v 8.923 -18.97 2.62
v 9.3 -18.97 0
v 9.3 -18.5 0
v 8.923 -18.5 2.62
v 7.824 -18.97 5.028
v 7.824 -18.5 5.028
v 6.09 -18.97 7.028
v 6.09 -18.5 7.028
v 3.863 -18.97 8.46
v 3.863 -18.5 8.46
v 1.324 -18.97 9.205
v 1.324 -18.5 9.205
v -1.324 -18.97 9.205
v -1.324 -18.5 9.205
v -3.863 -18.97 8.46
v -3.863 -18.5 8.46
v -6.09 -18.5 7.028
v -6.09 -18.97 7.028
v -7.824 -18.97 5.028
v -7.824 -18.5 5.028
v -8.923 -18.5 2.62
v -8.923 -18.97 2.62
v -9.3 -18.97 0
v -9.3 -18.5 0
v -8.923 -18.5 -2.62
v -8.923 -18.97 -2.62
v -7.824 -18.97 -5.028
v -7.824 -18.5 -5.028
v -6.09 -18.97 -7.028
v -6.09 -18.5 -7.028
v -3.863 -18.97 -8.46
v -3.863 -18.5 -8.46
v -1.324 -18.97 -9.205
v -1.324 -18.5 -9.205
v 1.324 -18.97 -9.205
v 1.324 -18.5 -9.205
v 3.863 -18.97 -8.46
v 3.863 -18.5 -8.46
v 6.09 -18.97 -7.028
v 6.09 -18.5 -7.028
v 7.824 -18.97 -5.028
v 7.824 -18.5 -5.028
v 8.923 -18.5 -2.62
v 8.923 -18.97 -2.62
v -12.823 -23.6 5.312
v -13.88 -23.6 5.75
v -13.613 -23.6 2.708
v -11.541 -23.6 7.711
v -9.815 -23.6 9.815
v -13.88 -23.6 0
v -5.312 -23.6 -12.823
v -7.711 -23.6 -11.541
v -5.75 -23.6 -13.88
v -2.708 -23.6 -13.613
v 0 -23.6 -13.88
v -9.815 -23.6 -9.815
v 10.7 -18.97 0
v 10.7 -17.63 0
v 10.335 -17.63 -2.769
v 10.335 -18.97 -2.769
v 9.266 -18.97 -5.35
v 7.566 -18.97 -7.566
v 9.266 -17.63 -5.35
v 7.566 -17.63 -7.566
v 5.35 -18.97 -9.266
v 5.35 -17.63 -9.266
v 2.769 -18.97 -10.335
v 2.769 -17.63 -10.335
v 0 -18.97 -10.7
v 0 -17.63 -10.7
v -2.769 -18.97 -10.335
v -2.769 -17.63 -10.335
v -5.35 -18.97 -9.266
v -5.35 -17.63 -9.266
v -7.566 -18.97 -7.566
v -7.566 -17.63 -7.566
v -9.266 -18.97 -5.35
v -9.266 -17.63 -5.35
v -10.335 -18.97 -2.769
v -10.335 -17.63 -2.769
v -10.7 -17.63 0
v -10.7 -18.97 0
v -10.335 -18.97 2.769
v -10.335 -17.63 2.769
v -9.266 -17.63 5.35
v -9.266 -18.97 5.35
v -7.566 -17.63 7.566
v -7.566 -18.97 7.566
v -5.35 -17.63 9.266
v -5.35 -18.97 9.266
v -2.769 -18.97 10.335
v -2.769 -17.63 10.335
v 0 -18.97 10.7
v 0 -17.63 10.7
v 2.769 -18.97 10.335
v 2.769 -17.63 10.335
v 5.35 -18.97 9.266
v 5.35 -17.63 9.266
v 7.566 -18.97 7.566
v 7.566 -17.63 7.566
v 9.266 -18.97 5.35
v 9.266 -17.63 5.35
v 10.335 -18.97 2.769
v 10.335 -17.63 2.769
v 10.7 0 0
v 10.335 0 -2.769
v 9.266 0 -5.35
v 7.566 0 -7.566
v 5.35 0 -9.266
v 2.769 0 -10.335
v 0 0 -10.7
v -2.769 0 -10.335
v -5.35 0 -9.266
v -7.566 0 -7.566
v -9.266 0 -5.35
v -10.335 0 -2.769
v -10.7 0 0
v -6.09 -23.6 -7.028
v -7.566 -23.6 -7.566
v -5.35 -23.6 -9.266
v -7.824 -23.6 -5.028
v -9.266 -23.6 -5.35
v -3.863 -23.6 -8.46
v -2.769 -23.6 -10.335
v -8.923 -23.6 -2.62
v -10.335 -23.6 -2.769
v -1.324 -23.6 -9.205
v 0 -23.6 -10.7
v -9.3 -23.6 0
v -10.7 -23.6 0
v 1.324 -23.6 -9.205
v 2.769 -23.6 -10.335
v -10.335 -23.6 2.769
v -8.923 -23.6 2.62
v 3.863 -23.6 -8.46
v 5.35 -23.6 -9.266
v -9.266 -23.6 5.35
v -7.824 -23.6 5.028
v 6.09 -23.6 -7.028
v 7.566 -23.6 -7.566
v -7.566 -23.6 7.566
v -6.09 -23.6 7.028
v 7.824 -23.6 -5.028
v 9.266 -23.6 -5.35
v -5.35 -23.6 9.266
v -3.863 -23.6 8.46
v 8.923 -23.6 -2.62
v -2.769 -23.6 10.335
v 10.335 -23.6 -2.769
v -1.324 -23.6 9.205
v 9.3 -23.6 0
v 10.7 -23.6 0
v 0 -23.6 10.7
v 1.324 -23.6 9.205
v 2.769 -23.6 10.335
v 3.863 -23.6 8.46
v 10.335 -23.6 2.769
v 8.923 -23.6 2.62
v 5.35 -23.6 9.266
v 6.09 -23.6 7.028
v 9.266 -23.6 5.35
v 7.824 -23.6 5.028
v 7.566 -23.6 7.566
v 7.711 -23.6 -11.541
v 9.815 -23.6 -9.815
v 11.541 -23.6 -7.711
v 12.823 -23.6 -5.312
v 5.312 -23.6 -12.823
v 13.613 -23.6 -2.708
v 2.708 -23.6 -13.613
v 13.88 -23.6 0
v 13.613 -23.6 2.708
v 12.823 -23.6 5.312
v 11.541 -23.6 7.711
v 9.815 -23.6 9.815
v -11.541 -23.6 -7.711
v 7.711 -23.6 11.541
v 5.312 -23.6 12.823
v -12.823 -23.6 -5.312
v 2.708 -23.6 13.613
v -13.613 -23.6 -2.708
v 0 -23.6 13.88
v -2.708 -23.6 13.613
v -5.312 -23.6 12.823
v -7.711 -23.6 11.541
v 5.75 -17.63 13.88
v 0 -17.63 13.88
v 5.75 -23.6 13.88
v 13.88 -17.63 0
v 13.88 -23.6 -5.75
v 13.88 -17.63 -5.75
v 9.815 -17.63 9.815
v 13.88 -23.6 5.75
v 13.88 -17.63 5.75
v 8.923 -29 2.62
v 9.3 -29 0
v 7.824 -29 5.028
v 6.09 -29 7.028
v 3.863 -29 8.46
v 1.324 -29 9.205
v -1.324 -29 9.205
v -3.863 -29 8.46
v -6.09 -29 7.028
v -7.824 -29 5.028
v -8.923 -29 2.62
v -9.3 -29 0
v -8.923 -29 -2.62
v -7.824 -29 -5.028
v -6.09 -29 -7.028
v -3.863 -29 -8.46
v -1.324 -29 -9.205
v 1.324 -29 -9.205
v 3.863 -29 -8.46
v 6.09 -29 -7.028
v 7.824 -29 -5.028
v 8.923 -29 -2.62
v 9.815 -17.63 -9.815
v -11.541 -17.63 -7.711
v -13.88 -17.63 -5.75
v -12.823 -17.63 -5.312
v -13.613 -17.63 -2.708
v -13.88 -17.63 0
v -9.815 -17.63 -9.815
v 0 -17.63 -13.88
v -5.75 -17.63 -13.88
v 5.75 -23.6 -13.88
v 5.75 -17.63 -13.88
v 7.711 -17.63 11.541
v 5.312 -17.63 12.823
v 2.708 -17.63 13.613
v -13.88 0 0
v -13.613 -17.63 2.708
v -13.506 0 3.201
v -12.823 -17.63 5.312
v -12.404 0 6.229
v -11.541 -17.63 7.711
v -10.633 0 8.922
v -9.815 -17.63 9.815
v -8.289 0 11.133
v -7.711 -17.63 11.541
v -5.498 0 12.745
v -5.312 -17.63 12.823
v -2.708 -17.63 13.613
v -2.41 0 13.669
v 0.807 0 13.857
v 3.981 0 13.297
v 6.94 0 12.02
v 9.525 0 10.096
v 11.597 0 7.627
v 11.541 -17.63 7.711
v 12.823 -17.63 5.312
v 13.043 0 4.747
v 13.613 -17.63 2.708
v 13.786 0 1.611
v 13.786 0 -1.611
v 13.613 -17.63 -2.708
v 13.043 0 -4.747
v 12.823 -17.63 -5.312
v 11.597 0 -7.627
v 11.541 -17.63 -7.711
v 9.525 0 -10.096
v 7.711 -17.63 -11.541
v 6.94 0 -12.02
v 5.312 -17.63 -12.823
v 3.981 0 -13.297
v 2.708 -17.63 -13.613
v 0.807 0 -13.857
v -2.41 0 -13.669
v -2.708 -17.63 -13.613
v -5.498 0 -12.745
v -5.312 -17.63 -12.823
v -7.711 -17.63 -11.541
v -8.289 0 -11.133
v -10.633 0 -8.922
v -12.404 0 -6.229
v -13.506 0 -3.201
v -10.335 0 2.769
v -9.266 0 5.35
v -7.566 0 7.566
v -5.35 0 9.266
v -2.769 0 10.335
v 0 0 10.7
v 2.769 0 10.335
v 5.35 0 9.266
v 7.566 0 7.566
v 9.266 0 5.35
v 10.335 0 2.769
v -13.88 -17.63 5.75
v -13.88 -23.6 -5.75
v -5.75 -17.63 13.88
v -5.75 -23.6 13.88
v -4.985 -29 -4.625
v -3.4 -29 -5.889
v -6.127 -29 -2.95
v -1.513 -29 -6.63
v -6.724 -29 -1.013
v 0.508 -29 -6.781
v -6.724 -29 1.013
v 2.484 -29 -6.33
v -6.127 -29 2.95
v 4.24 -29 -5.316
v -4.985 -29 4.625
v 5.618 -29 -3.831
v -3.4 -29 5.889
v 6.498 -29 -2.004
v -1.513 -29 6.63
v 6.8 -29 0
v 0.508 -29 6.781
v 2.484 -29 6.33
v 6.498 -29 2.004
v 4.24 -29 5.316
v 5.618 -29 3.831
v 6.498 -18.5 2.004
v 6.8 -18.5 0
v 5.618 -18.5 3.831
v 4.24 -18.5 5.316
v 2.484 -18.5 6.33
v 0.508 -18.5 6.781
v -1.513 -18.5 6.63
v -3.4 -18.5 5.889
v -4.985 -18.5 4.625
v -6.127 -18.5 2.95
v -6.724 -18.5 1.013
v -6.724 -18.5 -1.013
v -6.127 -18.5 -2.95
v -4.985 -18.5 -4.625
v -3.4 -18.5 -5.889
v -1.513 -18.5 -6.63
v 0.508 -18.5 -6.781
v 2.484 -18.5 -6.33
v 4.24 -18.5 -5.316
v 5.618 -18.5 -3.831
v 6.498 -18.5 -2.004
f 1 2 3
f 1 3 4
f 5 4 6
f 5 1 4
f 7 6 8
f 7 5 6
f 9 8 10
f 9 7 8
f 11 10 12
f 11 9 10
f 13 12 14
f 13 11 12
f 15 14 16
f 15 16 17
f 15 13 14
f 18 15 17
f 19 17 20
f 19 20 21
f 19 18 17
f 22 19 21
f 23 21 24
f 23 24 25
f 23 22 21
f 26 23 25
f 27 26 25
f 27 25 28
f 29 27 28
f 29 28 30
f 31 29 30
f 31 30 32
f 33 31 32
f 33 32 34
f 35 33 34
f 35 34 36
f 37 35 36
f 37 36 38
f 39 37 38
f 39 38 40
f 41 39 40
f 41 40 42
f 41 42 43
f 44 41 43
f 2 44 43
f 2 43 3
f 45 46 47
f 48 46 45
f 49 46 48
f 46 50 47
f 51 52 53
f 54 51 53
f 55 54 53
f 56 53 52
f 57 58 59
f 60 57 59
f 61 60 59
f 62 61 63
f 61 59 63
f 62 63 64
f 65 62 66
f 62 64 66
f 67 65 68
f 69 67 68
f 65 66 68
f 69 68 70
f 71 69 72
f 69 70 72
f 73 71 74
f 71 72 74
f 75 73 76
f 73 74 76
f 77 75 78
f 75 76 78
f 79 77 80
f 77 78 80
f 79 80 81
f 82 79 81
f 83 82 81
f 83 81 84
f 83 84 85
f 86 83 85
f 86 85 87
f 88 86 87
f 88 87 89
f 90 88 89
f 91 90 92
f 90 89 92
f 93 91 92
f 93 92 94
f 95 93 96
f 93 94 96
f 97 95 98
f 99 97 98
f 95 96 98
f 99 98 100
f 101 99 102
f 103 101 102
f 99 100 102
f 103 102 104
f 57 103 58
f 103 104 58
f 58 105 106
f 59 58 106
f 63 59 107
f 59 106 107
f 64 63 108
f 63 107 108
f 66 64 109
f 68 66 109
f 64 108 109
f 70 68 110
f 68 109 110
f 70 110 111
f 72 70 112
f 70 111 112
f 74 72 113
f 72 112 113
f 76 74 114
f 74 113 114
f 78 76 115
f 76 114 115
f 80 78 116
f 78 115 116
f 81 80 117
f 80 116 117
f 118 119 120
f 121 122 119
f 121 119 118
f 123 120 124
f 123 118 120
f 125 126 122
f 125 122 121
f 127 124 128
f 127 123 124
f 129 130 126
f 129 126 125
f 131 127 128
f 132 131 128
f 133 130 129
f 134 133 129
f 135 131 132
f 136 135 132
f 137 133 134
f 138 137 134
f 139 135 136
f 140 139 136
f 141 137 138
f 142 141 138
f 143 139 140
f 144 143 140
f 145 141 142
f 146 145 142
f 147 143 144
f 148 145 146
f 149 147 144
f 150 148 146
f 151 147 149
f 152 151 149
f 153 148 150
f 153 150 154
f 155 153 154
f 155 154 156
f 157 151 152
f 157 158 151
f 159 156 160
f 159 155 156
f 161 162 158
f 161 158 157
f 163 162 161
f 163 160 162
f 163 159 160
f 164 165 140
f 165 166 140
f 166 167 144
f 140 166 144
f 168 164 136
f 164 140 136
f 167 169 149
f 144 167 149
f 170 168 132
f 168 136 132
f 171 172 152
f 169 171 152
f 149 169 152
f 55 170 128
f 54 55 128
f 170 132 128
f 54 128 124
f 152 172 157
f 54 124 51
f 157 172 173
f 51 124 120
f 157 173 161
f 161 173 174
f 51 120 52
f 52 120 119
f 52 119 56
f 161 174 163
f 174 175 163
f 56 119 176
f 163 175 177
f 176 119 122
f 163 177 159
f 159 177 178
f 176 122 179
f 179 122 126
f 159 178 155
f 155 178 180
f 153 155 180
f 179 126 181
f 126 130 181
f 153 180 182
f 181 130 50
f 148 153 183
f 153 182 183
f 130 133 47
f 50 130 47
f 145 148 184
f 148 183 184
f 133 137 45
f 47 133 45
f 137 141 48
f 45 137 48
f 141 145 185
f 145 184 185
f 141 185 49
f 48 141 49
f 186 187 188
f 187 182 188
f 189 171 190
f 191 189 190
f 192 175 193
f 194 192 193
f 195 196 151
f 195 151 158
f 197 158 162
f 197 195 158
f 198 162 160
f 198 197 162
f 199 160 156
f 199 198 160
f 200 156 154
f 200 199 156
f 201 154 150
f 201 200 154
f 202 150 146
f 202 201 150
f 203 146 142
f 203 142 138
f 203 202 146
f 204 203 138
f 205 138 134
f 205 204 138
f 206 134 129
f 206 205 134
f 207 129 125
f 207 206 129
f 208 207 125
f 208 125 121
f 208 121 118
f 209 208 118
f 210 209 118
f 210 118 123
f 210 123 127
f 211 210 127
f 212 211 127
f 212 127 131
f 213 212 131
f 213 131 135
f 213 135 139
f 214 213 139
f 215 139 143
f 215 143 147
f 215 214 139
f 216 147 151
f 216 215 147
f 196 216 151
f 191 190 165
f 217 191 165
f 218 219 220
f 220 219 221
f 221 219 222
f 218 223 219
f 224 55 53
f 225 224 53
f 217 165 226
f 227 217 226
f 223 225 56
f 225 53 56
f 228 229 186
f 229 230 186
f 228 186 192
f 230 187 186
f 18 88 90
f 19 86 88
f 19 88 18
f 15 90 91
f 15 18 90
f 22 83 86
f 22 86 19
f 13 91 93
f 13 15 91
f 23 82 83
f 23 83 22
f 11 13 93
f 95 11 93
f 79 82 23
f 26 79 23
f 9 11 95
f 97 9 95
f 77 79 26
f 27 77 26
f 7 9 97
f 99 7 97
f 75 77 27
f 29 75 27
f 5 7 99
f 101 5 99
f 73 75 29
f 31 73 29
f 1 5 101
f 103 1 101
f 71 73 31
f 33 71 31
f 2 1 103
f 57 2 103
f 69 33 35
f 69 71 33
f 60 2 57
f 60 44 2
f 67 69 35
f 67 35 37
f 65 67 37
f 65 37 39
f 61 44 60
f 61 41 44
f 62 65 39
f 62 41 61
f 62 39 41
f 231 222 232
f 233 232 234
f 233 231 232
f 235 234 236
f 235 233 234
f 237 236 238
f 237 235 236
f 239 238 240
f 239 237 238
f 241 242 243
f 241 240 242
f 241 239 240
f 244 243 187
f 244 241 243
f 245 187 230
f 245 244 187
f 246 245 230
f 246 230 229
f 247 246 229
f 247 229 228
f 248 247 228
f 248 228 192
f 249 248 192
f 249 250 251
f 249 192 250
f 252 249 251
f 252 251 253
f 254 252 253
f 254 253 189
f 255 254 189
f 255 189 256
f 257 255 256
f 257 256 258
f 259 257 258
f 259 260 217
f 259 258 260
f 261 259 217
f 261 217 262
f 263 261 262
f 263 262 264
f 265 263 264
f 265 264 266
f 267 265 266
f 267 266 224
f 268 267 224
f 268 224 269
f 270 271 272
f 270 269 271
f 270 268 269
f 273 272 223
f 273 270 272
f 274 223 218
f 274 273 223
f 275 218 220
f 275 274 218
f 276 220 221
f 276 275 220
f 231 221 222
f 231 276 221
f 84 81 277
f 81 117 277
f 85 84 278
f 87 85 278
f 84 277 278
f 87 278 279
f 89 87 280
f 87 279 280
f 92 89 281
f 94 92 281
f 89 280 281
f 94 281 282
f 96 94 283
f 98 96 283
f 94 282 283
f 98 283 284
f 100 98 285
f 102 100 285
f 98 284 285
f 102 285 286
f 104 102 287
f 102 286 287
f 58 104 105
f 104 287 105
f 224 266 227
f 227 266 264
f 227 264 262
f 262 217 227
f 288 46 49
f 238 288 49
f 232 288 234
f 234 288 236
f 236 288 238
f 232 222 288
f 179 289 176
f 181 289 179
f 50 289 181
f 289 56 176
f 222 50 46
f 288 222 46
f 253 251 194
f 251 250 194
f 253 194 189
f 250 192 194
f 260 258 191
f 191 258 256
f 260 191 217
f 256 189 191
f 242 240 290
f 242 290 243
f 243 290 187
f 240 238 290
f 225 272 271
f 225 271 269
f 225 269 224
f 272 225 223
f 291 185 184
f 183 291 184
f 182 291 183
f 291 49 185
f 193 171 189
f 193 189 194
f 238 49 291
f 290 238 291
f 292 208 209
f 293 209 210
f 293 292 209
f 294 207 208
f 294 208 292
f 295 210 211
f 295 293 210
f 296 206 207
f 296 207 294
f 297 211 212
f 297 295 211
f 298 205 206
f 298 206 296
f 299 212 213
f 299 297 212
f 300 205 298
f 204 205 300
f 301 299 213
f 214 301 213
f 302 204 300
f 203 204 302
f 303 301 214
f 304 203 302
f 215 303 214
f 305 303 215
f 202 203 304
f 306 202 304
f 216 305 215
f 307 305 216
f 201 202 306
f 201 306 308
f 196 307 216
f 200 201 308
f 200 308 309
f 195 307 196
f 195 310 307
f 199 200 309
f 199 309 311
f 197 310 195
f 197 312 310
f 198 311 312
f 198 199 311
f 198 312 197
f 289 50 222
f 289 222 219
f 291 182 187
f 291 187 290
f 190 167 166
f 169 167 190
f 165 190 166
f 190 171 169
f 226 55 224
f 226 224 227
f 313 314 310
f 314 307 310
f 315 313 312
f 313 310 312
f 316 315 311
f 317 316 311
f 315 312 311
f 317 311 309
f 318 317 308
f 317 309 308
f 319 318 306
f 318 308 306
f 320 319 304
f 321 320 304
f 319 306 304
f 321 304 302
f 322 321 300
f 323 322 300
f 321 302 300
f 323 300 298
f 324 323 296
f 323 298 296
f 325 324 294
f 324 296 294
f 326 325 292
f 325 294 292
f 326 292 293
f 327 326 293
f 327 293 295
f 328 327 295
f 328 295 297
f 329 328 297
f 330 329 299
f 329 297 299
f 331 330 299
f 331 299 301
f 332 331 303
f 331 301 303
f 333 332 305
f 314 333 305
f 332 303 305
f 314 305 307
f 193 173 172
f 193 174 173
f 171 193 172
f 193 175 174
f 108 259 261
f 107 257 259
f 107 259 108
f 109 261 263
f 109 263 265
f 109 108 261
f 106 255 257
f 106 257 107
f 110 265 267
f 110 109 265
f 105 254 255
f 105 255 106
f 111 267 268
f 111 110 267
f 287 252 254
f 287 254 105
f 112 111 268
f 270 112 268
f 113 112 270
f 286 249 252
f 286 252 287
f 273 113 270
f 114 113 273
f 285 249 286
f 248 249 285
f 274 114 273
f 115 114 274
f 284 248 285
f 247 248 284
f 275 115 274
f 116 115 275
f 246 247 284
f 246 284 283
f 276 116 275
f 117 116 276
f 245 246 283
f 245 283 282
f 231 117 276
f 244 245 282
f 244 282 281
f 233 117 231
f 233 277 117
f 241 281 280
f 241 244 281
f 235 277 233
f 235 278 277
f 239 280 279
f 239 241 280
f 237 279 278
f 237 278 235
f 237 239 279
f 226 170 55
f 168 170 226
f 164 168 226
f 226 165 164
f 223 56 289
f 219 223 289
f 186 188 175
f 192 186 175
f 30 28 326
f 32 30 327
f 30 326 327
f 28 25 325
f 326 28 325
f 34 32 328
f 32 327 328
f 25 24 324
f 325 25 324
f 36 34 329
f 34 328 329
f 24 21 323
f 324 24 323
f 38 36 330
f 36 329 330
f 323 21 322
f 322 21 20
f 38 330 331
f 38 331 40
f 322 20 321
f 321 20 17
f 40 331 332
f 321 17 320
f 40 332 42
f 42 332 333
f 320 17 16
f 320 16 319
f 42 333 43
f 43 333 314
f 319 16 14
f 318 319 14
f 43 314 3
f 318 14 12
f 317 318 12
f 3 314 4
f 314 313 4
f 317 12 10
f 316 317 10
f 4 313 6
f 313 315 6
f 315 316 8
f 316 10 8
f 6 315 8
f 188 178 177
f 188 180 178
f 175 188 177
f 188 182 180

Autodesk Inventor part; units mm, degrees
ref_plane "YZ Plane" through (0, 0, 0) normal (1, 0, 0) x (0, 1, 0)
ref_plane "XZ Plane" through (0, 0, 0) normal (0, 1, 0) x (-1, 0, 0)
sketch "Boceto1" plane through (0, 0, 0) normal (0, 1, 0) x (-1, 0, 0)
  circle A0 centre (0, 0) radius 10.7
  circle A1 centre (0, 0) radius 13.88
  dimension "d0" = 21.4
  dimension "d1" = 27.76
extrude "Extrusión1" add sketch "Boceto1" against normal blind 23.6
sketch "Boceto2" plane through (0, -23.6, 0) normal (0, -1, 0) x (1, 0, 0)
  circle A0 centre (0, 0) radius 13.88 projected
  line L0 (0, -13.88) -> (-5.75, -13.88)
  line L1 (0, -13.88) -> (5.75, -13.88)
  line L2 (13.88, 0) -> (13.88, -5.75)
  line L3 (13.88, 0) -> (13.88, 5.75)
  line L4 (0, 13.88) -> (5.75, 13.88)
  line L5 (0, 13.88) -> (-5.75, 13.88)
  line L6 (-13.88, 0) -> (-13.88, -5.75)
  line L7 (-13.88, 0) -> (-13.88, 5.75)
  line L8 (-13.88, 5.75) -> (-5.75, 13.88)
  line L9 (5.75, 13.88) -> (13.88, 5.75)
  line L10 (13.88, -5.75) -> (5.75, -13.88)
  line L11 (-5.75, -13.88) -> (-13.88, -5.75)
  dimension "d5" = 5.75
  dimension "d6" = 5.75
  dimension "d7" = 5.75
  dimension "d8" = 5.75
  dimension "d9" = 5.75
  dimension "d10" = 5.75
  dimension "d11" = 5.75
  dimension "d12" = 5.75
extrude "Extrusión2" add sketch "Boceto2" against normal blind 5.97
ref_plane "Plano de trabajo2" through (0, -18.5, 0) normal (0, 1, 0) x (1, 0, 0)
sketch "Boceto4" plane through (0, -18.5, 0) normal (0, 1, 0) x (1, 0, 0)
  circle A0 centre (0, 0) radius 6.8
  dimension "d18" = 13.6
extrude "Extrusión4" add sketch "Boceto4" against normal blind 18.97
sketch "Boceto5" plane through (0, 0, 0) normal (0, 1, 0) x (1, 0, 0)
  circle A0 centre (0, 0) radius 10.7
extrude "Extrusión5" cut sketch "Boceto5" against normal blind 18.97
sketch "Boceto6" plane through (0, -37.47, 0) normal (0, -1, 0) x (1, 0, 0)
  circle A0 centre (0, 0) radius 6.7
  circle A1 centre (0, 0) radius 9.3
  dimension "d25" = 13.4
  dimension "d26" = 18.6
extrude "Extrusión6" add sketch "Boceto6" against normal blind 18.97
sketch "Boceto7" plane through (0, -37.47, 0) normal (0, -1, 0) x (1, 0, 0)
  circle A0 centre (0, 0) radius 6.8
  dimension "d29" = 13.6
extrude "Extrusión7" cut sketch "Boceto7" against normal blind 18.97
thread "Rosca2" size "M20x2.5" class "6g" standard "ANSI Metric M Profile" full length
sketch "Boceto9" plane through (0, -37.47, 0) normal (0, -1, 0) x (1, 0, 0)
  circle A0 centre (0, 0) radius 9.3
extrude "Extrusión8" cut sketch "Boceto9" against normal blind 8.47
properties part number "Acople con rosca" material "PVC, no plastificado"
